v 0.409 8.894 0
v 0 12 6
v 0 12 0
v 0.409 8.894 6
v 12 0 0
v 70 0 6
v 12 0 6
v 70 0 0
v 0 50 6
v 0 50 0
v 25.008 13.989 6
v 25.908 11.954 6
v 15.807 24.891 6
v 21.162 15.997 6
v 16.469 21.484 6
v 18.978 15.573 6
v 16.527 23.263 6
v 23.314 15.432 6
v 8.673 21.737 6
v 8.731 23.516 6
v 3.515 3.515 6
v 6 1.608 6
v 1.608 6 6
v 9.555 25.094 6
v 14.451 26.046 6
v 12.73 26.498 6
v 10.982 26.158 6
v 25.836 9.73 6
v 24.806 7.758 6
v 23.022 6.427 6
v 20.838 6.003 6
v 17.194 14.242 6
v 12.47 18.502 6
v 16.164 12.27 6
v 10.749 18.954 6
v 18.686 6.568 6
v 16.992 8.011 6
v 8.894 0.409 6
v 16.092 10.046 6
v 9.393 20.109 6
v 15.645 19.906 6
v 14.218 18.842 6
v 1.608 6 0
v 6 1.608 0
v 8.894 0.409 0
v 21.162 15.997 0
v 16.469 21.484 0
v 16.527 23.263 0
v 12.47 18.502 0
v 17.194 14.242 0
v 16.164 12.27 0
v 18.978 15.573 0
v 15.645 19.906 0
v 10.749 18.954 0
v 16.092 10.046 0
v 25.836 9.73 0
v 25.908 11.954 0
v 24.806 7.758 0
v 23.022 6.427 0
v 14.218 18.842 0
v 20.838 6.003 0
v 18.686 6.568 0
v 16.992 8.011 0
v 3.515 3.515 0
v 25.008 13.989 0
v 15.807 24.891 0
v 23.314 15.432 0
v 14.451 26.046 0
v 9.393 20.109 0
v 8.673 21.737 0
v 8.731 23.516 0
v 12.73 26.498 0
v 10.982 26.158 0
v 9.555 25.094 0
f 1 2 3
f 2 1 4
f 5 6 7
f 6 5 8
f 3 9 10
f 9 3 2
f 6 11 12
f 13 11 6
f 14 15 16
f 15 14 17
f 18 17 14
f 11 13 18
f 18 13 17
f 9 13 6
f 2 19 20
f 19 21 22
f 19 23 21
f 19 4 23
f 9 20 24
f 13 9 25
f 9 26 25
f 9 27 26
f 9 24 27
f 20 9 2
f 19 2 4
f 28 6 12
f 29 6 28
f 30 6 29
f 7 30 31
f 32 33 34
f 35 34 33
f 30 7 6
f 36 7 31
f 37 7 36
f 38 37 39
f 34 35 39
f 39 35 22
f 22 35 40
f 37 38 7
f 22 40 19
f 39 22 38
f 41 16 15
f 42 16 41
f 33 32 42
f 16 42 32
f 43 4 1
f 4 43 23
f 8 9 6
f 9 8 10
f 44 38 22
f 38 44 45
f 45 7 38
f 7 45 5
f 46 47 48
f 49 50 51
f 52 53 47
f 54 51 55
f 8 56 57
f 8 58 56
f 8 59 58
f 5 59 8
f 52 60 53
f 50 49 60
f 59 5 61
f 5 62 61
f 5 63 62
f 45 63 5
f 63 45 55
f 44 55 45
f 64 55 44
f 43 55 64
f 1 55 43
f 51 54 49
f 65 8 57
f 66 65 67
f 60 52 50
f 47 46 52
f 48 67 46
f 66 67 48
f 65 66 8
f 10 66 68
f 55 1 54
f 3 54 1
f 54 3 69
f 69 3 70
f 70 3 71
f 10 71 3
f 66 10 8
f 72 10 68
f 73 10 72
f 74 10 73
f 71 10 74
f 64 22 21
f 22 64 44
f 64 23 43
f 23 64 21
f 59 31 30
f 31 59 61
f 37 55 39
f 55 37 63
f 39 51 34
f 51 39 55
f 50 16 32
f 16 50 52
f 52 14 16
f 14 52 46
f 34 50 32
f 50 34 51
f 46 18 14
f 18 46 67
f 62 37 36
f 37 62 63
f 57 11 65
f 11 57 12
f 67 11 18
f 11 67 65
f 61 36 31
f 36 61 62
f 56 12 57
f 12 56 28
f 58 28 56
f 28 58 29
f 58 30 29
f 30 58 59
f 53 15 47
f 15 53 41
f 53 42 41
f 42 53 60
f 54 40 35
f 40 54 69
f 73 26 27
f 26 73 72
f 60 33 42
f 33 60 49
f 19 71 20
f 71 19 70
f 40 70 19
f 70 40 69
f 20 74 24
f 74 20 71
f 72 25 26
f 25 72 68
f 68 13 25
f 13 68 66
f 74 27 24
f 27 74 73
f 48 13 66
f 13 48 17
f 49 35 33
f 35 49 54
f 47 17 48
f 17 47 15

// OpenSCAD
$fn = 32;

// ----------------------------------------------------------------------
// Bracket plate: corner pad 70 x 50, fillet R12
// ----------------------------------------------------------------------

// --- parameters (mm) ---
hole_r = 4;               // bolt hole radius
plate_t = 6;              // plate thickness, Z (extrusion height)
leg_a = 70;               // base leg
leg_b = 50;               // height leg
fillet_r = 12;            // right-angle fillet radius

hole_d1 = 2 * hole_r + 2;
hole_d2 = 2 * hole_r;

profile = [[12, 0], [70, 0], [0, 50], [0, 12], [0.409, 8.894], [1.608, 6], [3.515, 3.515], [6, 1.608], [8.894, 0.409]];  // primary outline, 9 points, counter clockwise
void_1 = [[25.908, 11.954], [25.008, 13.989], [23.314, 15.432], [21.162, 15.997], [18.978, 15.573], [17.194, 14.242], [16.164, 12.27], [16.092, 10.046], [16.992, 8.011], [18.686, 6.568], [20.838, 6.003], [23.022, 6.427], [24.806, 7.758], [25.836, 9.73]];  // mount hole 1, 14 points
void_2 = [[16.527, 23.263], [15.807, 24.891], [14.451, 26.046], [12.73, 26.498], [10.982, 26.158], [9.555, 25.094], [8.731, 23.516], [8.673, 21.737], [9.393, 20.109], [10.749, 18.954], [12.47, 18.502], [14.218, 18.842], [15.645, 19.906], [16.469, 21.484]];  // mount hole 2, 14 points

// --- the one profile operation ---
difference() {
  linear_extrude(height = plate_t) polygon(points = profile);
  translate([0, 0, -1])
    linear_extrude(height = plate_t + 2) polygon(points = void_1);
  translate([0, 0, -1])
    linear_extrude(height = plate_t + 2) polygon(points = void_2);
}
